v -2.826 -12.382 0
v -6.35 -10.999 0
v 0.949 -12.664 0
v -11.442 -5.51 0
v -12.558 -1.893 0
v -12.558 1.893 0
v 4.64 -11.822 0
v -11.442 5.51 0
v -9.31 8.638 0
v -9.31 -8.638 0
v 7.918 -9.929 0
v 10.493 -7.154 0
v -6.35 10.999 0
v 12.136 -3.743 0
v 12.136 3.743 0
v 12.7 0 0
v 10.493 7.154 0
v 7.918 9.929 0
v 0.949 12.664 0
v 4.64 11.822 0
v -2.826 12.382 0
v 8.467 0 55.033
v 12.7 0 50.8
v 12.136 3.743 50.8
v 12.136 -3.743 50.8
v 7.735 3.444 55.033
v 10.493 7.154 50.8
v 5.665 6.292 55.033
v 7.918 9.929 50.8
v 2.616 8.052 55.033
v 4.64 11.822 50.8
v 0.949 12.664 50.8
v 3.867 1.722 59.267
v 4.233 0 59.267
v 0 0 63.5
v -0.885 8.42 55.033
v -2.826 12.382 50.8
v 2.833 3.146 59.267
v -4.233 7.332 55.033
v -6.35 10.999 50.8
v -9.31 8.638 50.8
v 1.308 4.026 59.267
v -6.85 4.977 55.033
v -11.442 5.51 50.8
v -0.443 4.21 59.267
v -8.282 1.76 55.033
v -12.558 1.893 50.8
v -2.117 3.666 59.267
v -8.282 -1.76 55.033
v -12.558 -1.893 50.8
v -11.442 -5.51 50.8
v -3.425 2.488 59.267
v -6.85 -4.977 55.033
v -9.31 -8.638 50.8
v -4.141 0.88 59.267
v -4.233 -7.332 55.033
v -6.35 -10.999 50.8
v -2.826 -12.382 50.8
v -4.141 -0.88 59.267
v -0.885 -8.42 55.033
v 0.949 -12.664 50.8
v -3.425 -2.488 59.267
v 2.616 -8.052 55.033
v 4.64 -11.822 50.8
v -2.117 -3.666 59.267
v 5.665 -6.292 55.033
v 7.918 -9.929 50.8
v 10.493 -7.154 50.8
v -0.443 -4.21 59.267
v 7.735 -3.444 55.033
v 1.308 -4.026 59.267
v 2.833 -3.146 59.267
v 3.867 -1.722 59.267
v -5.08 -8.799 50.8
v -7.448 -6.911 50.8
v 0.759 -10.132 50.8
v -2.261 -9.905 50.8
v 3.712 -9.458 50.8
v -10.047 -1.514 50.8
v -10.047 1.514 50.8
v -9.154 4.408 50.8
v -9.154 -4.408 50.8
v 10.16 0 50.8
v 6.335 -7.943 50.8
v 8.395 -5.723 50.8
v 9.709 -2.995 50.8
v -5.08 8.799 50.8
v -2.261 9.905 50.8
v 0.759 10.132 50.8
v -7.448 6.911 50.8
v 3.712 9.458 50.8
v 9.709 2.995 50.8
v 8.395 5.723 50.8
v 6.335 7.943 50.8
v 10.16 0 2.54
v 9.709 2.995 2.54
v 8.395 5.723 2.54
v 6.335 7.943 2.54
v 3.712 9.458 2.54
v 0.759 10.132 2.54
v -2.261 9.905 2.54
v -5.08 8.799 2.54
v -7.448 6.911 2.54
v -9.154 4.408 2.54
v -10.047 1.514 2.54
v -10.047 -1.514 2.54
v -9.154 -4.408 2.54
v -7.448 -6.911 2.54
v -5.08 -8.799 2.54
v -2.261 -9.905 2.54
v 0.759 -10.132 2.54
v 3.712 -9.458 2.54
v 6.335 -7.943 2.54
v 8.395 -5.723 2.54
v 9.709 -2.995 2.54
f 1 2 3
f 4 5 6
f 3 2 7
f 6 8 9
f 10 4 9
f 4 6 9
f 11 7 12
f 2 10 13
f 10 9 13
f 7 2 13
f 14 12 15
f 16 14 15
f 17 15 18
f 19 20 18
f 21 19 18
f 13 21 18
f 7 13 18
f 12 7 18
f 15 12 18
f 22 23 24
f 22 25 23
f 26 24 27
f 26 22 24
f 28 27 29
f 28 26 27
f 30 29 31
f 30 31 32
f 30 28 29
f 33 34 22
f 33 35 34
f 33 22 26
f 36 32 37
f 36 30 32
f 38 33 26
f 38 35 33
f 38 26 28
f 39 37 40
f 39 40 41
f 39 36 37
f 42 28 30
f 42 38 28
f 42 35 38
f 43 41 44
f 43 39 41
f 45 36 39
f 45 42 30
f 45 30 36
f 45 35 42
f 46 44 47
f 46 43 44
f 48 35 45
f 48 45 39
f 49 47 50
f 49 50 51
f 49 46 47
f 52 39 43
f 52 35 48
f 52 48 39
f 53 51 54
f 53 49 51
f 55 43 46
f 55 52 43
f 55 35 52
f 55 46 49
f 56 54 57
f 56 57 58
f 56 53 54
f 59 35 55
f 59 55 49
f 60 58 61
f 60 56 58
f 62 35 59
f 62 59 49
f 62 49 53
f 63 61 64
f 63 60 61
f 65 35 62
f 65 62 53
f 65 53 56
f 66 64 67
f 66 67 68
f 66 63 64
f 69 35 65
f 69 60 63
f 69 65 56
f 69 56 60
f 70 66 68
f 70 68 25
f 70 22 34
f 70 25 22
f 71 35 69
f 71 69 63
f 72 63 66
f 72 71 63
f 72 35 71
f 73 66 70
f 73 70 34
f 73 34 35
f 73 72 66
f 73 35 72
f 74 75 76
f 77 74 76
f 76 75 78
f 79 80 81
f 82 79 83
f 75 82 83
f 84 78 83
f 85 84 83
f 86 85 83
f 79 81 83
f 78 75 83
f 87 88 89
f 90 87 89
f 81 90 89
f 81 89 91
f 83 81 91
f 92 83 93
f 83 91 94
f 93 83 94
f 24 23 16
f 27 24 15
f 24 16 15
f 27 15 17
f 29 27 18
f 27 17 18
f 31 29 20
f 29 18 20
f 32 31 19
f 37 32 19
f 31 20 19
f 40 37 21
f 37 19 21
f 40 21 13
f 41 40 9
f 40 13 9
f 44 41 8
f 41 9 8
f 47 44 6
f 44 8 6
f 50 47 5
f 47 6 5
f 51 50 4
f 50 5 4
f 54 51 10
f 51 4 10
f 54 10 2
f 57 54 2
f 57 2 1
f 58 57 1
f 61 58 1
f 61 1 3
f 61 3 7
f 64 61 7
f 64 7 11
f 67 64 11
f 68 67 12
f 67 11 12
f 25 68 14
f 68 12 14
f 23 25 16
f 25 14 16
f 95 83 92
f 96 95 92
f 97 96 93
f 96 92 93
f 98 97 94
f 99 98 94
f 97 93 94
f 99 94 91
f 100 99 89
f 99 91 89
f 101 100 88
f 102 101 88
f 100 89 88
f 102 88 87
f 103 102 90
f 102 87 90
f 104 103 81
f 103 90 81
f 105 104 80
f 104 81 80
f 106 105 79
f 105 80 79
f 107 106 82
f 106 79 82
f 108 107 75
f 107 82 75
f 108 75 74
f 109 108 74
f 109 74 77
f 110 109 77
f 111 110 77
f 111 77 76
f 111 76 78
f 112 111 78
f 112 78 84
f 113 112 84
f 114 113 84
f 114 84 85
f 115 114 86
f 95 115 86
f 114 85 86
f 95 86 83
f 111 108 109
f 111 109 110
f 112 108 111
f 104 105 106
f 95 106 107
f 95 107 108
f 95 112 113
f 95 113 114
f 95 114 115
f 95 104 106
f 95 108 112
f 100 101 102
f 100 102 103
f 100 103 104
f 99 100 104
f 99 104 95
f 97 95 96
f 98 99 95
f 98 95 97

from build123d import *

# Parameters (mm, degrees)
F0_R     = 12.7
F1_DEPTH = 50.8
F2_R     = 10.16
F3_DEPTH = 48.26
F4_R     = 12.7
F5_DEPTH = 25.4
F5_TAPER = 45


with BuildPart() as f1:
    # F0 (on Top) → F1 (new body)
    with BuildSketch(Plane.XY):
        Circle(F0_R)
    extrude(amount=F1_DEPTH)

    # F2 (on face) → F3 (cut)
    with BuildSketch(Plane.XY.offset(50.8)):
        Circle(F2_R)
    extrude(amount=-F3_DEPTH, mode=Mode.SUBTRACT)

    # F4 (on face) → F5 (join)
    with BuildSketch(Plane.XY.offset(50.8)):
        Circle(F4_R)
    extrude(amount=F5_DEPTH, taper=F5_TAPER)


solid = f1.part
